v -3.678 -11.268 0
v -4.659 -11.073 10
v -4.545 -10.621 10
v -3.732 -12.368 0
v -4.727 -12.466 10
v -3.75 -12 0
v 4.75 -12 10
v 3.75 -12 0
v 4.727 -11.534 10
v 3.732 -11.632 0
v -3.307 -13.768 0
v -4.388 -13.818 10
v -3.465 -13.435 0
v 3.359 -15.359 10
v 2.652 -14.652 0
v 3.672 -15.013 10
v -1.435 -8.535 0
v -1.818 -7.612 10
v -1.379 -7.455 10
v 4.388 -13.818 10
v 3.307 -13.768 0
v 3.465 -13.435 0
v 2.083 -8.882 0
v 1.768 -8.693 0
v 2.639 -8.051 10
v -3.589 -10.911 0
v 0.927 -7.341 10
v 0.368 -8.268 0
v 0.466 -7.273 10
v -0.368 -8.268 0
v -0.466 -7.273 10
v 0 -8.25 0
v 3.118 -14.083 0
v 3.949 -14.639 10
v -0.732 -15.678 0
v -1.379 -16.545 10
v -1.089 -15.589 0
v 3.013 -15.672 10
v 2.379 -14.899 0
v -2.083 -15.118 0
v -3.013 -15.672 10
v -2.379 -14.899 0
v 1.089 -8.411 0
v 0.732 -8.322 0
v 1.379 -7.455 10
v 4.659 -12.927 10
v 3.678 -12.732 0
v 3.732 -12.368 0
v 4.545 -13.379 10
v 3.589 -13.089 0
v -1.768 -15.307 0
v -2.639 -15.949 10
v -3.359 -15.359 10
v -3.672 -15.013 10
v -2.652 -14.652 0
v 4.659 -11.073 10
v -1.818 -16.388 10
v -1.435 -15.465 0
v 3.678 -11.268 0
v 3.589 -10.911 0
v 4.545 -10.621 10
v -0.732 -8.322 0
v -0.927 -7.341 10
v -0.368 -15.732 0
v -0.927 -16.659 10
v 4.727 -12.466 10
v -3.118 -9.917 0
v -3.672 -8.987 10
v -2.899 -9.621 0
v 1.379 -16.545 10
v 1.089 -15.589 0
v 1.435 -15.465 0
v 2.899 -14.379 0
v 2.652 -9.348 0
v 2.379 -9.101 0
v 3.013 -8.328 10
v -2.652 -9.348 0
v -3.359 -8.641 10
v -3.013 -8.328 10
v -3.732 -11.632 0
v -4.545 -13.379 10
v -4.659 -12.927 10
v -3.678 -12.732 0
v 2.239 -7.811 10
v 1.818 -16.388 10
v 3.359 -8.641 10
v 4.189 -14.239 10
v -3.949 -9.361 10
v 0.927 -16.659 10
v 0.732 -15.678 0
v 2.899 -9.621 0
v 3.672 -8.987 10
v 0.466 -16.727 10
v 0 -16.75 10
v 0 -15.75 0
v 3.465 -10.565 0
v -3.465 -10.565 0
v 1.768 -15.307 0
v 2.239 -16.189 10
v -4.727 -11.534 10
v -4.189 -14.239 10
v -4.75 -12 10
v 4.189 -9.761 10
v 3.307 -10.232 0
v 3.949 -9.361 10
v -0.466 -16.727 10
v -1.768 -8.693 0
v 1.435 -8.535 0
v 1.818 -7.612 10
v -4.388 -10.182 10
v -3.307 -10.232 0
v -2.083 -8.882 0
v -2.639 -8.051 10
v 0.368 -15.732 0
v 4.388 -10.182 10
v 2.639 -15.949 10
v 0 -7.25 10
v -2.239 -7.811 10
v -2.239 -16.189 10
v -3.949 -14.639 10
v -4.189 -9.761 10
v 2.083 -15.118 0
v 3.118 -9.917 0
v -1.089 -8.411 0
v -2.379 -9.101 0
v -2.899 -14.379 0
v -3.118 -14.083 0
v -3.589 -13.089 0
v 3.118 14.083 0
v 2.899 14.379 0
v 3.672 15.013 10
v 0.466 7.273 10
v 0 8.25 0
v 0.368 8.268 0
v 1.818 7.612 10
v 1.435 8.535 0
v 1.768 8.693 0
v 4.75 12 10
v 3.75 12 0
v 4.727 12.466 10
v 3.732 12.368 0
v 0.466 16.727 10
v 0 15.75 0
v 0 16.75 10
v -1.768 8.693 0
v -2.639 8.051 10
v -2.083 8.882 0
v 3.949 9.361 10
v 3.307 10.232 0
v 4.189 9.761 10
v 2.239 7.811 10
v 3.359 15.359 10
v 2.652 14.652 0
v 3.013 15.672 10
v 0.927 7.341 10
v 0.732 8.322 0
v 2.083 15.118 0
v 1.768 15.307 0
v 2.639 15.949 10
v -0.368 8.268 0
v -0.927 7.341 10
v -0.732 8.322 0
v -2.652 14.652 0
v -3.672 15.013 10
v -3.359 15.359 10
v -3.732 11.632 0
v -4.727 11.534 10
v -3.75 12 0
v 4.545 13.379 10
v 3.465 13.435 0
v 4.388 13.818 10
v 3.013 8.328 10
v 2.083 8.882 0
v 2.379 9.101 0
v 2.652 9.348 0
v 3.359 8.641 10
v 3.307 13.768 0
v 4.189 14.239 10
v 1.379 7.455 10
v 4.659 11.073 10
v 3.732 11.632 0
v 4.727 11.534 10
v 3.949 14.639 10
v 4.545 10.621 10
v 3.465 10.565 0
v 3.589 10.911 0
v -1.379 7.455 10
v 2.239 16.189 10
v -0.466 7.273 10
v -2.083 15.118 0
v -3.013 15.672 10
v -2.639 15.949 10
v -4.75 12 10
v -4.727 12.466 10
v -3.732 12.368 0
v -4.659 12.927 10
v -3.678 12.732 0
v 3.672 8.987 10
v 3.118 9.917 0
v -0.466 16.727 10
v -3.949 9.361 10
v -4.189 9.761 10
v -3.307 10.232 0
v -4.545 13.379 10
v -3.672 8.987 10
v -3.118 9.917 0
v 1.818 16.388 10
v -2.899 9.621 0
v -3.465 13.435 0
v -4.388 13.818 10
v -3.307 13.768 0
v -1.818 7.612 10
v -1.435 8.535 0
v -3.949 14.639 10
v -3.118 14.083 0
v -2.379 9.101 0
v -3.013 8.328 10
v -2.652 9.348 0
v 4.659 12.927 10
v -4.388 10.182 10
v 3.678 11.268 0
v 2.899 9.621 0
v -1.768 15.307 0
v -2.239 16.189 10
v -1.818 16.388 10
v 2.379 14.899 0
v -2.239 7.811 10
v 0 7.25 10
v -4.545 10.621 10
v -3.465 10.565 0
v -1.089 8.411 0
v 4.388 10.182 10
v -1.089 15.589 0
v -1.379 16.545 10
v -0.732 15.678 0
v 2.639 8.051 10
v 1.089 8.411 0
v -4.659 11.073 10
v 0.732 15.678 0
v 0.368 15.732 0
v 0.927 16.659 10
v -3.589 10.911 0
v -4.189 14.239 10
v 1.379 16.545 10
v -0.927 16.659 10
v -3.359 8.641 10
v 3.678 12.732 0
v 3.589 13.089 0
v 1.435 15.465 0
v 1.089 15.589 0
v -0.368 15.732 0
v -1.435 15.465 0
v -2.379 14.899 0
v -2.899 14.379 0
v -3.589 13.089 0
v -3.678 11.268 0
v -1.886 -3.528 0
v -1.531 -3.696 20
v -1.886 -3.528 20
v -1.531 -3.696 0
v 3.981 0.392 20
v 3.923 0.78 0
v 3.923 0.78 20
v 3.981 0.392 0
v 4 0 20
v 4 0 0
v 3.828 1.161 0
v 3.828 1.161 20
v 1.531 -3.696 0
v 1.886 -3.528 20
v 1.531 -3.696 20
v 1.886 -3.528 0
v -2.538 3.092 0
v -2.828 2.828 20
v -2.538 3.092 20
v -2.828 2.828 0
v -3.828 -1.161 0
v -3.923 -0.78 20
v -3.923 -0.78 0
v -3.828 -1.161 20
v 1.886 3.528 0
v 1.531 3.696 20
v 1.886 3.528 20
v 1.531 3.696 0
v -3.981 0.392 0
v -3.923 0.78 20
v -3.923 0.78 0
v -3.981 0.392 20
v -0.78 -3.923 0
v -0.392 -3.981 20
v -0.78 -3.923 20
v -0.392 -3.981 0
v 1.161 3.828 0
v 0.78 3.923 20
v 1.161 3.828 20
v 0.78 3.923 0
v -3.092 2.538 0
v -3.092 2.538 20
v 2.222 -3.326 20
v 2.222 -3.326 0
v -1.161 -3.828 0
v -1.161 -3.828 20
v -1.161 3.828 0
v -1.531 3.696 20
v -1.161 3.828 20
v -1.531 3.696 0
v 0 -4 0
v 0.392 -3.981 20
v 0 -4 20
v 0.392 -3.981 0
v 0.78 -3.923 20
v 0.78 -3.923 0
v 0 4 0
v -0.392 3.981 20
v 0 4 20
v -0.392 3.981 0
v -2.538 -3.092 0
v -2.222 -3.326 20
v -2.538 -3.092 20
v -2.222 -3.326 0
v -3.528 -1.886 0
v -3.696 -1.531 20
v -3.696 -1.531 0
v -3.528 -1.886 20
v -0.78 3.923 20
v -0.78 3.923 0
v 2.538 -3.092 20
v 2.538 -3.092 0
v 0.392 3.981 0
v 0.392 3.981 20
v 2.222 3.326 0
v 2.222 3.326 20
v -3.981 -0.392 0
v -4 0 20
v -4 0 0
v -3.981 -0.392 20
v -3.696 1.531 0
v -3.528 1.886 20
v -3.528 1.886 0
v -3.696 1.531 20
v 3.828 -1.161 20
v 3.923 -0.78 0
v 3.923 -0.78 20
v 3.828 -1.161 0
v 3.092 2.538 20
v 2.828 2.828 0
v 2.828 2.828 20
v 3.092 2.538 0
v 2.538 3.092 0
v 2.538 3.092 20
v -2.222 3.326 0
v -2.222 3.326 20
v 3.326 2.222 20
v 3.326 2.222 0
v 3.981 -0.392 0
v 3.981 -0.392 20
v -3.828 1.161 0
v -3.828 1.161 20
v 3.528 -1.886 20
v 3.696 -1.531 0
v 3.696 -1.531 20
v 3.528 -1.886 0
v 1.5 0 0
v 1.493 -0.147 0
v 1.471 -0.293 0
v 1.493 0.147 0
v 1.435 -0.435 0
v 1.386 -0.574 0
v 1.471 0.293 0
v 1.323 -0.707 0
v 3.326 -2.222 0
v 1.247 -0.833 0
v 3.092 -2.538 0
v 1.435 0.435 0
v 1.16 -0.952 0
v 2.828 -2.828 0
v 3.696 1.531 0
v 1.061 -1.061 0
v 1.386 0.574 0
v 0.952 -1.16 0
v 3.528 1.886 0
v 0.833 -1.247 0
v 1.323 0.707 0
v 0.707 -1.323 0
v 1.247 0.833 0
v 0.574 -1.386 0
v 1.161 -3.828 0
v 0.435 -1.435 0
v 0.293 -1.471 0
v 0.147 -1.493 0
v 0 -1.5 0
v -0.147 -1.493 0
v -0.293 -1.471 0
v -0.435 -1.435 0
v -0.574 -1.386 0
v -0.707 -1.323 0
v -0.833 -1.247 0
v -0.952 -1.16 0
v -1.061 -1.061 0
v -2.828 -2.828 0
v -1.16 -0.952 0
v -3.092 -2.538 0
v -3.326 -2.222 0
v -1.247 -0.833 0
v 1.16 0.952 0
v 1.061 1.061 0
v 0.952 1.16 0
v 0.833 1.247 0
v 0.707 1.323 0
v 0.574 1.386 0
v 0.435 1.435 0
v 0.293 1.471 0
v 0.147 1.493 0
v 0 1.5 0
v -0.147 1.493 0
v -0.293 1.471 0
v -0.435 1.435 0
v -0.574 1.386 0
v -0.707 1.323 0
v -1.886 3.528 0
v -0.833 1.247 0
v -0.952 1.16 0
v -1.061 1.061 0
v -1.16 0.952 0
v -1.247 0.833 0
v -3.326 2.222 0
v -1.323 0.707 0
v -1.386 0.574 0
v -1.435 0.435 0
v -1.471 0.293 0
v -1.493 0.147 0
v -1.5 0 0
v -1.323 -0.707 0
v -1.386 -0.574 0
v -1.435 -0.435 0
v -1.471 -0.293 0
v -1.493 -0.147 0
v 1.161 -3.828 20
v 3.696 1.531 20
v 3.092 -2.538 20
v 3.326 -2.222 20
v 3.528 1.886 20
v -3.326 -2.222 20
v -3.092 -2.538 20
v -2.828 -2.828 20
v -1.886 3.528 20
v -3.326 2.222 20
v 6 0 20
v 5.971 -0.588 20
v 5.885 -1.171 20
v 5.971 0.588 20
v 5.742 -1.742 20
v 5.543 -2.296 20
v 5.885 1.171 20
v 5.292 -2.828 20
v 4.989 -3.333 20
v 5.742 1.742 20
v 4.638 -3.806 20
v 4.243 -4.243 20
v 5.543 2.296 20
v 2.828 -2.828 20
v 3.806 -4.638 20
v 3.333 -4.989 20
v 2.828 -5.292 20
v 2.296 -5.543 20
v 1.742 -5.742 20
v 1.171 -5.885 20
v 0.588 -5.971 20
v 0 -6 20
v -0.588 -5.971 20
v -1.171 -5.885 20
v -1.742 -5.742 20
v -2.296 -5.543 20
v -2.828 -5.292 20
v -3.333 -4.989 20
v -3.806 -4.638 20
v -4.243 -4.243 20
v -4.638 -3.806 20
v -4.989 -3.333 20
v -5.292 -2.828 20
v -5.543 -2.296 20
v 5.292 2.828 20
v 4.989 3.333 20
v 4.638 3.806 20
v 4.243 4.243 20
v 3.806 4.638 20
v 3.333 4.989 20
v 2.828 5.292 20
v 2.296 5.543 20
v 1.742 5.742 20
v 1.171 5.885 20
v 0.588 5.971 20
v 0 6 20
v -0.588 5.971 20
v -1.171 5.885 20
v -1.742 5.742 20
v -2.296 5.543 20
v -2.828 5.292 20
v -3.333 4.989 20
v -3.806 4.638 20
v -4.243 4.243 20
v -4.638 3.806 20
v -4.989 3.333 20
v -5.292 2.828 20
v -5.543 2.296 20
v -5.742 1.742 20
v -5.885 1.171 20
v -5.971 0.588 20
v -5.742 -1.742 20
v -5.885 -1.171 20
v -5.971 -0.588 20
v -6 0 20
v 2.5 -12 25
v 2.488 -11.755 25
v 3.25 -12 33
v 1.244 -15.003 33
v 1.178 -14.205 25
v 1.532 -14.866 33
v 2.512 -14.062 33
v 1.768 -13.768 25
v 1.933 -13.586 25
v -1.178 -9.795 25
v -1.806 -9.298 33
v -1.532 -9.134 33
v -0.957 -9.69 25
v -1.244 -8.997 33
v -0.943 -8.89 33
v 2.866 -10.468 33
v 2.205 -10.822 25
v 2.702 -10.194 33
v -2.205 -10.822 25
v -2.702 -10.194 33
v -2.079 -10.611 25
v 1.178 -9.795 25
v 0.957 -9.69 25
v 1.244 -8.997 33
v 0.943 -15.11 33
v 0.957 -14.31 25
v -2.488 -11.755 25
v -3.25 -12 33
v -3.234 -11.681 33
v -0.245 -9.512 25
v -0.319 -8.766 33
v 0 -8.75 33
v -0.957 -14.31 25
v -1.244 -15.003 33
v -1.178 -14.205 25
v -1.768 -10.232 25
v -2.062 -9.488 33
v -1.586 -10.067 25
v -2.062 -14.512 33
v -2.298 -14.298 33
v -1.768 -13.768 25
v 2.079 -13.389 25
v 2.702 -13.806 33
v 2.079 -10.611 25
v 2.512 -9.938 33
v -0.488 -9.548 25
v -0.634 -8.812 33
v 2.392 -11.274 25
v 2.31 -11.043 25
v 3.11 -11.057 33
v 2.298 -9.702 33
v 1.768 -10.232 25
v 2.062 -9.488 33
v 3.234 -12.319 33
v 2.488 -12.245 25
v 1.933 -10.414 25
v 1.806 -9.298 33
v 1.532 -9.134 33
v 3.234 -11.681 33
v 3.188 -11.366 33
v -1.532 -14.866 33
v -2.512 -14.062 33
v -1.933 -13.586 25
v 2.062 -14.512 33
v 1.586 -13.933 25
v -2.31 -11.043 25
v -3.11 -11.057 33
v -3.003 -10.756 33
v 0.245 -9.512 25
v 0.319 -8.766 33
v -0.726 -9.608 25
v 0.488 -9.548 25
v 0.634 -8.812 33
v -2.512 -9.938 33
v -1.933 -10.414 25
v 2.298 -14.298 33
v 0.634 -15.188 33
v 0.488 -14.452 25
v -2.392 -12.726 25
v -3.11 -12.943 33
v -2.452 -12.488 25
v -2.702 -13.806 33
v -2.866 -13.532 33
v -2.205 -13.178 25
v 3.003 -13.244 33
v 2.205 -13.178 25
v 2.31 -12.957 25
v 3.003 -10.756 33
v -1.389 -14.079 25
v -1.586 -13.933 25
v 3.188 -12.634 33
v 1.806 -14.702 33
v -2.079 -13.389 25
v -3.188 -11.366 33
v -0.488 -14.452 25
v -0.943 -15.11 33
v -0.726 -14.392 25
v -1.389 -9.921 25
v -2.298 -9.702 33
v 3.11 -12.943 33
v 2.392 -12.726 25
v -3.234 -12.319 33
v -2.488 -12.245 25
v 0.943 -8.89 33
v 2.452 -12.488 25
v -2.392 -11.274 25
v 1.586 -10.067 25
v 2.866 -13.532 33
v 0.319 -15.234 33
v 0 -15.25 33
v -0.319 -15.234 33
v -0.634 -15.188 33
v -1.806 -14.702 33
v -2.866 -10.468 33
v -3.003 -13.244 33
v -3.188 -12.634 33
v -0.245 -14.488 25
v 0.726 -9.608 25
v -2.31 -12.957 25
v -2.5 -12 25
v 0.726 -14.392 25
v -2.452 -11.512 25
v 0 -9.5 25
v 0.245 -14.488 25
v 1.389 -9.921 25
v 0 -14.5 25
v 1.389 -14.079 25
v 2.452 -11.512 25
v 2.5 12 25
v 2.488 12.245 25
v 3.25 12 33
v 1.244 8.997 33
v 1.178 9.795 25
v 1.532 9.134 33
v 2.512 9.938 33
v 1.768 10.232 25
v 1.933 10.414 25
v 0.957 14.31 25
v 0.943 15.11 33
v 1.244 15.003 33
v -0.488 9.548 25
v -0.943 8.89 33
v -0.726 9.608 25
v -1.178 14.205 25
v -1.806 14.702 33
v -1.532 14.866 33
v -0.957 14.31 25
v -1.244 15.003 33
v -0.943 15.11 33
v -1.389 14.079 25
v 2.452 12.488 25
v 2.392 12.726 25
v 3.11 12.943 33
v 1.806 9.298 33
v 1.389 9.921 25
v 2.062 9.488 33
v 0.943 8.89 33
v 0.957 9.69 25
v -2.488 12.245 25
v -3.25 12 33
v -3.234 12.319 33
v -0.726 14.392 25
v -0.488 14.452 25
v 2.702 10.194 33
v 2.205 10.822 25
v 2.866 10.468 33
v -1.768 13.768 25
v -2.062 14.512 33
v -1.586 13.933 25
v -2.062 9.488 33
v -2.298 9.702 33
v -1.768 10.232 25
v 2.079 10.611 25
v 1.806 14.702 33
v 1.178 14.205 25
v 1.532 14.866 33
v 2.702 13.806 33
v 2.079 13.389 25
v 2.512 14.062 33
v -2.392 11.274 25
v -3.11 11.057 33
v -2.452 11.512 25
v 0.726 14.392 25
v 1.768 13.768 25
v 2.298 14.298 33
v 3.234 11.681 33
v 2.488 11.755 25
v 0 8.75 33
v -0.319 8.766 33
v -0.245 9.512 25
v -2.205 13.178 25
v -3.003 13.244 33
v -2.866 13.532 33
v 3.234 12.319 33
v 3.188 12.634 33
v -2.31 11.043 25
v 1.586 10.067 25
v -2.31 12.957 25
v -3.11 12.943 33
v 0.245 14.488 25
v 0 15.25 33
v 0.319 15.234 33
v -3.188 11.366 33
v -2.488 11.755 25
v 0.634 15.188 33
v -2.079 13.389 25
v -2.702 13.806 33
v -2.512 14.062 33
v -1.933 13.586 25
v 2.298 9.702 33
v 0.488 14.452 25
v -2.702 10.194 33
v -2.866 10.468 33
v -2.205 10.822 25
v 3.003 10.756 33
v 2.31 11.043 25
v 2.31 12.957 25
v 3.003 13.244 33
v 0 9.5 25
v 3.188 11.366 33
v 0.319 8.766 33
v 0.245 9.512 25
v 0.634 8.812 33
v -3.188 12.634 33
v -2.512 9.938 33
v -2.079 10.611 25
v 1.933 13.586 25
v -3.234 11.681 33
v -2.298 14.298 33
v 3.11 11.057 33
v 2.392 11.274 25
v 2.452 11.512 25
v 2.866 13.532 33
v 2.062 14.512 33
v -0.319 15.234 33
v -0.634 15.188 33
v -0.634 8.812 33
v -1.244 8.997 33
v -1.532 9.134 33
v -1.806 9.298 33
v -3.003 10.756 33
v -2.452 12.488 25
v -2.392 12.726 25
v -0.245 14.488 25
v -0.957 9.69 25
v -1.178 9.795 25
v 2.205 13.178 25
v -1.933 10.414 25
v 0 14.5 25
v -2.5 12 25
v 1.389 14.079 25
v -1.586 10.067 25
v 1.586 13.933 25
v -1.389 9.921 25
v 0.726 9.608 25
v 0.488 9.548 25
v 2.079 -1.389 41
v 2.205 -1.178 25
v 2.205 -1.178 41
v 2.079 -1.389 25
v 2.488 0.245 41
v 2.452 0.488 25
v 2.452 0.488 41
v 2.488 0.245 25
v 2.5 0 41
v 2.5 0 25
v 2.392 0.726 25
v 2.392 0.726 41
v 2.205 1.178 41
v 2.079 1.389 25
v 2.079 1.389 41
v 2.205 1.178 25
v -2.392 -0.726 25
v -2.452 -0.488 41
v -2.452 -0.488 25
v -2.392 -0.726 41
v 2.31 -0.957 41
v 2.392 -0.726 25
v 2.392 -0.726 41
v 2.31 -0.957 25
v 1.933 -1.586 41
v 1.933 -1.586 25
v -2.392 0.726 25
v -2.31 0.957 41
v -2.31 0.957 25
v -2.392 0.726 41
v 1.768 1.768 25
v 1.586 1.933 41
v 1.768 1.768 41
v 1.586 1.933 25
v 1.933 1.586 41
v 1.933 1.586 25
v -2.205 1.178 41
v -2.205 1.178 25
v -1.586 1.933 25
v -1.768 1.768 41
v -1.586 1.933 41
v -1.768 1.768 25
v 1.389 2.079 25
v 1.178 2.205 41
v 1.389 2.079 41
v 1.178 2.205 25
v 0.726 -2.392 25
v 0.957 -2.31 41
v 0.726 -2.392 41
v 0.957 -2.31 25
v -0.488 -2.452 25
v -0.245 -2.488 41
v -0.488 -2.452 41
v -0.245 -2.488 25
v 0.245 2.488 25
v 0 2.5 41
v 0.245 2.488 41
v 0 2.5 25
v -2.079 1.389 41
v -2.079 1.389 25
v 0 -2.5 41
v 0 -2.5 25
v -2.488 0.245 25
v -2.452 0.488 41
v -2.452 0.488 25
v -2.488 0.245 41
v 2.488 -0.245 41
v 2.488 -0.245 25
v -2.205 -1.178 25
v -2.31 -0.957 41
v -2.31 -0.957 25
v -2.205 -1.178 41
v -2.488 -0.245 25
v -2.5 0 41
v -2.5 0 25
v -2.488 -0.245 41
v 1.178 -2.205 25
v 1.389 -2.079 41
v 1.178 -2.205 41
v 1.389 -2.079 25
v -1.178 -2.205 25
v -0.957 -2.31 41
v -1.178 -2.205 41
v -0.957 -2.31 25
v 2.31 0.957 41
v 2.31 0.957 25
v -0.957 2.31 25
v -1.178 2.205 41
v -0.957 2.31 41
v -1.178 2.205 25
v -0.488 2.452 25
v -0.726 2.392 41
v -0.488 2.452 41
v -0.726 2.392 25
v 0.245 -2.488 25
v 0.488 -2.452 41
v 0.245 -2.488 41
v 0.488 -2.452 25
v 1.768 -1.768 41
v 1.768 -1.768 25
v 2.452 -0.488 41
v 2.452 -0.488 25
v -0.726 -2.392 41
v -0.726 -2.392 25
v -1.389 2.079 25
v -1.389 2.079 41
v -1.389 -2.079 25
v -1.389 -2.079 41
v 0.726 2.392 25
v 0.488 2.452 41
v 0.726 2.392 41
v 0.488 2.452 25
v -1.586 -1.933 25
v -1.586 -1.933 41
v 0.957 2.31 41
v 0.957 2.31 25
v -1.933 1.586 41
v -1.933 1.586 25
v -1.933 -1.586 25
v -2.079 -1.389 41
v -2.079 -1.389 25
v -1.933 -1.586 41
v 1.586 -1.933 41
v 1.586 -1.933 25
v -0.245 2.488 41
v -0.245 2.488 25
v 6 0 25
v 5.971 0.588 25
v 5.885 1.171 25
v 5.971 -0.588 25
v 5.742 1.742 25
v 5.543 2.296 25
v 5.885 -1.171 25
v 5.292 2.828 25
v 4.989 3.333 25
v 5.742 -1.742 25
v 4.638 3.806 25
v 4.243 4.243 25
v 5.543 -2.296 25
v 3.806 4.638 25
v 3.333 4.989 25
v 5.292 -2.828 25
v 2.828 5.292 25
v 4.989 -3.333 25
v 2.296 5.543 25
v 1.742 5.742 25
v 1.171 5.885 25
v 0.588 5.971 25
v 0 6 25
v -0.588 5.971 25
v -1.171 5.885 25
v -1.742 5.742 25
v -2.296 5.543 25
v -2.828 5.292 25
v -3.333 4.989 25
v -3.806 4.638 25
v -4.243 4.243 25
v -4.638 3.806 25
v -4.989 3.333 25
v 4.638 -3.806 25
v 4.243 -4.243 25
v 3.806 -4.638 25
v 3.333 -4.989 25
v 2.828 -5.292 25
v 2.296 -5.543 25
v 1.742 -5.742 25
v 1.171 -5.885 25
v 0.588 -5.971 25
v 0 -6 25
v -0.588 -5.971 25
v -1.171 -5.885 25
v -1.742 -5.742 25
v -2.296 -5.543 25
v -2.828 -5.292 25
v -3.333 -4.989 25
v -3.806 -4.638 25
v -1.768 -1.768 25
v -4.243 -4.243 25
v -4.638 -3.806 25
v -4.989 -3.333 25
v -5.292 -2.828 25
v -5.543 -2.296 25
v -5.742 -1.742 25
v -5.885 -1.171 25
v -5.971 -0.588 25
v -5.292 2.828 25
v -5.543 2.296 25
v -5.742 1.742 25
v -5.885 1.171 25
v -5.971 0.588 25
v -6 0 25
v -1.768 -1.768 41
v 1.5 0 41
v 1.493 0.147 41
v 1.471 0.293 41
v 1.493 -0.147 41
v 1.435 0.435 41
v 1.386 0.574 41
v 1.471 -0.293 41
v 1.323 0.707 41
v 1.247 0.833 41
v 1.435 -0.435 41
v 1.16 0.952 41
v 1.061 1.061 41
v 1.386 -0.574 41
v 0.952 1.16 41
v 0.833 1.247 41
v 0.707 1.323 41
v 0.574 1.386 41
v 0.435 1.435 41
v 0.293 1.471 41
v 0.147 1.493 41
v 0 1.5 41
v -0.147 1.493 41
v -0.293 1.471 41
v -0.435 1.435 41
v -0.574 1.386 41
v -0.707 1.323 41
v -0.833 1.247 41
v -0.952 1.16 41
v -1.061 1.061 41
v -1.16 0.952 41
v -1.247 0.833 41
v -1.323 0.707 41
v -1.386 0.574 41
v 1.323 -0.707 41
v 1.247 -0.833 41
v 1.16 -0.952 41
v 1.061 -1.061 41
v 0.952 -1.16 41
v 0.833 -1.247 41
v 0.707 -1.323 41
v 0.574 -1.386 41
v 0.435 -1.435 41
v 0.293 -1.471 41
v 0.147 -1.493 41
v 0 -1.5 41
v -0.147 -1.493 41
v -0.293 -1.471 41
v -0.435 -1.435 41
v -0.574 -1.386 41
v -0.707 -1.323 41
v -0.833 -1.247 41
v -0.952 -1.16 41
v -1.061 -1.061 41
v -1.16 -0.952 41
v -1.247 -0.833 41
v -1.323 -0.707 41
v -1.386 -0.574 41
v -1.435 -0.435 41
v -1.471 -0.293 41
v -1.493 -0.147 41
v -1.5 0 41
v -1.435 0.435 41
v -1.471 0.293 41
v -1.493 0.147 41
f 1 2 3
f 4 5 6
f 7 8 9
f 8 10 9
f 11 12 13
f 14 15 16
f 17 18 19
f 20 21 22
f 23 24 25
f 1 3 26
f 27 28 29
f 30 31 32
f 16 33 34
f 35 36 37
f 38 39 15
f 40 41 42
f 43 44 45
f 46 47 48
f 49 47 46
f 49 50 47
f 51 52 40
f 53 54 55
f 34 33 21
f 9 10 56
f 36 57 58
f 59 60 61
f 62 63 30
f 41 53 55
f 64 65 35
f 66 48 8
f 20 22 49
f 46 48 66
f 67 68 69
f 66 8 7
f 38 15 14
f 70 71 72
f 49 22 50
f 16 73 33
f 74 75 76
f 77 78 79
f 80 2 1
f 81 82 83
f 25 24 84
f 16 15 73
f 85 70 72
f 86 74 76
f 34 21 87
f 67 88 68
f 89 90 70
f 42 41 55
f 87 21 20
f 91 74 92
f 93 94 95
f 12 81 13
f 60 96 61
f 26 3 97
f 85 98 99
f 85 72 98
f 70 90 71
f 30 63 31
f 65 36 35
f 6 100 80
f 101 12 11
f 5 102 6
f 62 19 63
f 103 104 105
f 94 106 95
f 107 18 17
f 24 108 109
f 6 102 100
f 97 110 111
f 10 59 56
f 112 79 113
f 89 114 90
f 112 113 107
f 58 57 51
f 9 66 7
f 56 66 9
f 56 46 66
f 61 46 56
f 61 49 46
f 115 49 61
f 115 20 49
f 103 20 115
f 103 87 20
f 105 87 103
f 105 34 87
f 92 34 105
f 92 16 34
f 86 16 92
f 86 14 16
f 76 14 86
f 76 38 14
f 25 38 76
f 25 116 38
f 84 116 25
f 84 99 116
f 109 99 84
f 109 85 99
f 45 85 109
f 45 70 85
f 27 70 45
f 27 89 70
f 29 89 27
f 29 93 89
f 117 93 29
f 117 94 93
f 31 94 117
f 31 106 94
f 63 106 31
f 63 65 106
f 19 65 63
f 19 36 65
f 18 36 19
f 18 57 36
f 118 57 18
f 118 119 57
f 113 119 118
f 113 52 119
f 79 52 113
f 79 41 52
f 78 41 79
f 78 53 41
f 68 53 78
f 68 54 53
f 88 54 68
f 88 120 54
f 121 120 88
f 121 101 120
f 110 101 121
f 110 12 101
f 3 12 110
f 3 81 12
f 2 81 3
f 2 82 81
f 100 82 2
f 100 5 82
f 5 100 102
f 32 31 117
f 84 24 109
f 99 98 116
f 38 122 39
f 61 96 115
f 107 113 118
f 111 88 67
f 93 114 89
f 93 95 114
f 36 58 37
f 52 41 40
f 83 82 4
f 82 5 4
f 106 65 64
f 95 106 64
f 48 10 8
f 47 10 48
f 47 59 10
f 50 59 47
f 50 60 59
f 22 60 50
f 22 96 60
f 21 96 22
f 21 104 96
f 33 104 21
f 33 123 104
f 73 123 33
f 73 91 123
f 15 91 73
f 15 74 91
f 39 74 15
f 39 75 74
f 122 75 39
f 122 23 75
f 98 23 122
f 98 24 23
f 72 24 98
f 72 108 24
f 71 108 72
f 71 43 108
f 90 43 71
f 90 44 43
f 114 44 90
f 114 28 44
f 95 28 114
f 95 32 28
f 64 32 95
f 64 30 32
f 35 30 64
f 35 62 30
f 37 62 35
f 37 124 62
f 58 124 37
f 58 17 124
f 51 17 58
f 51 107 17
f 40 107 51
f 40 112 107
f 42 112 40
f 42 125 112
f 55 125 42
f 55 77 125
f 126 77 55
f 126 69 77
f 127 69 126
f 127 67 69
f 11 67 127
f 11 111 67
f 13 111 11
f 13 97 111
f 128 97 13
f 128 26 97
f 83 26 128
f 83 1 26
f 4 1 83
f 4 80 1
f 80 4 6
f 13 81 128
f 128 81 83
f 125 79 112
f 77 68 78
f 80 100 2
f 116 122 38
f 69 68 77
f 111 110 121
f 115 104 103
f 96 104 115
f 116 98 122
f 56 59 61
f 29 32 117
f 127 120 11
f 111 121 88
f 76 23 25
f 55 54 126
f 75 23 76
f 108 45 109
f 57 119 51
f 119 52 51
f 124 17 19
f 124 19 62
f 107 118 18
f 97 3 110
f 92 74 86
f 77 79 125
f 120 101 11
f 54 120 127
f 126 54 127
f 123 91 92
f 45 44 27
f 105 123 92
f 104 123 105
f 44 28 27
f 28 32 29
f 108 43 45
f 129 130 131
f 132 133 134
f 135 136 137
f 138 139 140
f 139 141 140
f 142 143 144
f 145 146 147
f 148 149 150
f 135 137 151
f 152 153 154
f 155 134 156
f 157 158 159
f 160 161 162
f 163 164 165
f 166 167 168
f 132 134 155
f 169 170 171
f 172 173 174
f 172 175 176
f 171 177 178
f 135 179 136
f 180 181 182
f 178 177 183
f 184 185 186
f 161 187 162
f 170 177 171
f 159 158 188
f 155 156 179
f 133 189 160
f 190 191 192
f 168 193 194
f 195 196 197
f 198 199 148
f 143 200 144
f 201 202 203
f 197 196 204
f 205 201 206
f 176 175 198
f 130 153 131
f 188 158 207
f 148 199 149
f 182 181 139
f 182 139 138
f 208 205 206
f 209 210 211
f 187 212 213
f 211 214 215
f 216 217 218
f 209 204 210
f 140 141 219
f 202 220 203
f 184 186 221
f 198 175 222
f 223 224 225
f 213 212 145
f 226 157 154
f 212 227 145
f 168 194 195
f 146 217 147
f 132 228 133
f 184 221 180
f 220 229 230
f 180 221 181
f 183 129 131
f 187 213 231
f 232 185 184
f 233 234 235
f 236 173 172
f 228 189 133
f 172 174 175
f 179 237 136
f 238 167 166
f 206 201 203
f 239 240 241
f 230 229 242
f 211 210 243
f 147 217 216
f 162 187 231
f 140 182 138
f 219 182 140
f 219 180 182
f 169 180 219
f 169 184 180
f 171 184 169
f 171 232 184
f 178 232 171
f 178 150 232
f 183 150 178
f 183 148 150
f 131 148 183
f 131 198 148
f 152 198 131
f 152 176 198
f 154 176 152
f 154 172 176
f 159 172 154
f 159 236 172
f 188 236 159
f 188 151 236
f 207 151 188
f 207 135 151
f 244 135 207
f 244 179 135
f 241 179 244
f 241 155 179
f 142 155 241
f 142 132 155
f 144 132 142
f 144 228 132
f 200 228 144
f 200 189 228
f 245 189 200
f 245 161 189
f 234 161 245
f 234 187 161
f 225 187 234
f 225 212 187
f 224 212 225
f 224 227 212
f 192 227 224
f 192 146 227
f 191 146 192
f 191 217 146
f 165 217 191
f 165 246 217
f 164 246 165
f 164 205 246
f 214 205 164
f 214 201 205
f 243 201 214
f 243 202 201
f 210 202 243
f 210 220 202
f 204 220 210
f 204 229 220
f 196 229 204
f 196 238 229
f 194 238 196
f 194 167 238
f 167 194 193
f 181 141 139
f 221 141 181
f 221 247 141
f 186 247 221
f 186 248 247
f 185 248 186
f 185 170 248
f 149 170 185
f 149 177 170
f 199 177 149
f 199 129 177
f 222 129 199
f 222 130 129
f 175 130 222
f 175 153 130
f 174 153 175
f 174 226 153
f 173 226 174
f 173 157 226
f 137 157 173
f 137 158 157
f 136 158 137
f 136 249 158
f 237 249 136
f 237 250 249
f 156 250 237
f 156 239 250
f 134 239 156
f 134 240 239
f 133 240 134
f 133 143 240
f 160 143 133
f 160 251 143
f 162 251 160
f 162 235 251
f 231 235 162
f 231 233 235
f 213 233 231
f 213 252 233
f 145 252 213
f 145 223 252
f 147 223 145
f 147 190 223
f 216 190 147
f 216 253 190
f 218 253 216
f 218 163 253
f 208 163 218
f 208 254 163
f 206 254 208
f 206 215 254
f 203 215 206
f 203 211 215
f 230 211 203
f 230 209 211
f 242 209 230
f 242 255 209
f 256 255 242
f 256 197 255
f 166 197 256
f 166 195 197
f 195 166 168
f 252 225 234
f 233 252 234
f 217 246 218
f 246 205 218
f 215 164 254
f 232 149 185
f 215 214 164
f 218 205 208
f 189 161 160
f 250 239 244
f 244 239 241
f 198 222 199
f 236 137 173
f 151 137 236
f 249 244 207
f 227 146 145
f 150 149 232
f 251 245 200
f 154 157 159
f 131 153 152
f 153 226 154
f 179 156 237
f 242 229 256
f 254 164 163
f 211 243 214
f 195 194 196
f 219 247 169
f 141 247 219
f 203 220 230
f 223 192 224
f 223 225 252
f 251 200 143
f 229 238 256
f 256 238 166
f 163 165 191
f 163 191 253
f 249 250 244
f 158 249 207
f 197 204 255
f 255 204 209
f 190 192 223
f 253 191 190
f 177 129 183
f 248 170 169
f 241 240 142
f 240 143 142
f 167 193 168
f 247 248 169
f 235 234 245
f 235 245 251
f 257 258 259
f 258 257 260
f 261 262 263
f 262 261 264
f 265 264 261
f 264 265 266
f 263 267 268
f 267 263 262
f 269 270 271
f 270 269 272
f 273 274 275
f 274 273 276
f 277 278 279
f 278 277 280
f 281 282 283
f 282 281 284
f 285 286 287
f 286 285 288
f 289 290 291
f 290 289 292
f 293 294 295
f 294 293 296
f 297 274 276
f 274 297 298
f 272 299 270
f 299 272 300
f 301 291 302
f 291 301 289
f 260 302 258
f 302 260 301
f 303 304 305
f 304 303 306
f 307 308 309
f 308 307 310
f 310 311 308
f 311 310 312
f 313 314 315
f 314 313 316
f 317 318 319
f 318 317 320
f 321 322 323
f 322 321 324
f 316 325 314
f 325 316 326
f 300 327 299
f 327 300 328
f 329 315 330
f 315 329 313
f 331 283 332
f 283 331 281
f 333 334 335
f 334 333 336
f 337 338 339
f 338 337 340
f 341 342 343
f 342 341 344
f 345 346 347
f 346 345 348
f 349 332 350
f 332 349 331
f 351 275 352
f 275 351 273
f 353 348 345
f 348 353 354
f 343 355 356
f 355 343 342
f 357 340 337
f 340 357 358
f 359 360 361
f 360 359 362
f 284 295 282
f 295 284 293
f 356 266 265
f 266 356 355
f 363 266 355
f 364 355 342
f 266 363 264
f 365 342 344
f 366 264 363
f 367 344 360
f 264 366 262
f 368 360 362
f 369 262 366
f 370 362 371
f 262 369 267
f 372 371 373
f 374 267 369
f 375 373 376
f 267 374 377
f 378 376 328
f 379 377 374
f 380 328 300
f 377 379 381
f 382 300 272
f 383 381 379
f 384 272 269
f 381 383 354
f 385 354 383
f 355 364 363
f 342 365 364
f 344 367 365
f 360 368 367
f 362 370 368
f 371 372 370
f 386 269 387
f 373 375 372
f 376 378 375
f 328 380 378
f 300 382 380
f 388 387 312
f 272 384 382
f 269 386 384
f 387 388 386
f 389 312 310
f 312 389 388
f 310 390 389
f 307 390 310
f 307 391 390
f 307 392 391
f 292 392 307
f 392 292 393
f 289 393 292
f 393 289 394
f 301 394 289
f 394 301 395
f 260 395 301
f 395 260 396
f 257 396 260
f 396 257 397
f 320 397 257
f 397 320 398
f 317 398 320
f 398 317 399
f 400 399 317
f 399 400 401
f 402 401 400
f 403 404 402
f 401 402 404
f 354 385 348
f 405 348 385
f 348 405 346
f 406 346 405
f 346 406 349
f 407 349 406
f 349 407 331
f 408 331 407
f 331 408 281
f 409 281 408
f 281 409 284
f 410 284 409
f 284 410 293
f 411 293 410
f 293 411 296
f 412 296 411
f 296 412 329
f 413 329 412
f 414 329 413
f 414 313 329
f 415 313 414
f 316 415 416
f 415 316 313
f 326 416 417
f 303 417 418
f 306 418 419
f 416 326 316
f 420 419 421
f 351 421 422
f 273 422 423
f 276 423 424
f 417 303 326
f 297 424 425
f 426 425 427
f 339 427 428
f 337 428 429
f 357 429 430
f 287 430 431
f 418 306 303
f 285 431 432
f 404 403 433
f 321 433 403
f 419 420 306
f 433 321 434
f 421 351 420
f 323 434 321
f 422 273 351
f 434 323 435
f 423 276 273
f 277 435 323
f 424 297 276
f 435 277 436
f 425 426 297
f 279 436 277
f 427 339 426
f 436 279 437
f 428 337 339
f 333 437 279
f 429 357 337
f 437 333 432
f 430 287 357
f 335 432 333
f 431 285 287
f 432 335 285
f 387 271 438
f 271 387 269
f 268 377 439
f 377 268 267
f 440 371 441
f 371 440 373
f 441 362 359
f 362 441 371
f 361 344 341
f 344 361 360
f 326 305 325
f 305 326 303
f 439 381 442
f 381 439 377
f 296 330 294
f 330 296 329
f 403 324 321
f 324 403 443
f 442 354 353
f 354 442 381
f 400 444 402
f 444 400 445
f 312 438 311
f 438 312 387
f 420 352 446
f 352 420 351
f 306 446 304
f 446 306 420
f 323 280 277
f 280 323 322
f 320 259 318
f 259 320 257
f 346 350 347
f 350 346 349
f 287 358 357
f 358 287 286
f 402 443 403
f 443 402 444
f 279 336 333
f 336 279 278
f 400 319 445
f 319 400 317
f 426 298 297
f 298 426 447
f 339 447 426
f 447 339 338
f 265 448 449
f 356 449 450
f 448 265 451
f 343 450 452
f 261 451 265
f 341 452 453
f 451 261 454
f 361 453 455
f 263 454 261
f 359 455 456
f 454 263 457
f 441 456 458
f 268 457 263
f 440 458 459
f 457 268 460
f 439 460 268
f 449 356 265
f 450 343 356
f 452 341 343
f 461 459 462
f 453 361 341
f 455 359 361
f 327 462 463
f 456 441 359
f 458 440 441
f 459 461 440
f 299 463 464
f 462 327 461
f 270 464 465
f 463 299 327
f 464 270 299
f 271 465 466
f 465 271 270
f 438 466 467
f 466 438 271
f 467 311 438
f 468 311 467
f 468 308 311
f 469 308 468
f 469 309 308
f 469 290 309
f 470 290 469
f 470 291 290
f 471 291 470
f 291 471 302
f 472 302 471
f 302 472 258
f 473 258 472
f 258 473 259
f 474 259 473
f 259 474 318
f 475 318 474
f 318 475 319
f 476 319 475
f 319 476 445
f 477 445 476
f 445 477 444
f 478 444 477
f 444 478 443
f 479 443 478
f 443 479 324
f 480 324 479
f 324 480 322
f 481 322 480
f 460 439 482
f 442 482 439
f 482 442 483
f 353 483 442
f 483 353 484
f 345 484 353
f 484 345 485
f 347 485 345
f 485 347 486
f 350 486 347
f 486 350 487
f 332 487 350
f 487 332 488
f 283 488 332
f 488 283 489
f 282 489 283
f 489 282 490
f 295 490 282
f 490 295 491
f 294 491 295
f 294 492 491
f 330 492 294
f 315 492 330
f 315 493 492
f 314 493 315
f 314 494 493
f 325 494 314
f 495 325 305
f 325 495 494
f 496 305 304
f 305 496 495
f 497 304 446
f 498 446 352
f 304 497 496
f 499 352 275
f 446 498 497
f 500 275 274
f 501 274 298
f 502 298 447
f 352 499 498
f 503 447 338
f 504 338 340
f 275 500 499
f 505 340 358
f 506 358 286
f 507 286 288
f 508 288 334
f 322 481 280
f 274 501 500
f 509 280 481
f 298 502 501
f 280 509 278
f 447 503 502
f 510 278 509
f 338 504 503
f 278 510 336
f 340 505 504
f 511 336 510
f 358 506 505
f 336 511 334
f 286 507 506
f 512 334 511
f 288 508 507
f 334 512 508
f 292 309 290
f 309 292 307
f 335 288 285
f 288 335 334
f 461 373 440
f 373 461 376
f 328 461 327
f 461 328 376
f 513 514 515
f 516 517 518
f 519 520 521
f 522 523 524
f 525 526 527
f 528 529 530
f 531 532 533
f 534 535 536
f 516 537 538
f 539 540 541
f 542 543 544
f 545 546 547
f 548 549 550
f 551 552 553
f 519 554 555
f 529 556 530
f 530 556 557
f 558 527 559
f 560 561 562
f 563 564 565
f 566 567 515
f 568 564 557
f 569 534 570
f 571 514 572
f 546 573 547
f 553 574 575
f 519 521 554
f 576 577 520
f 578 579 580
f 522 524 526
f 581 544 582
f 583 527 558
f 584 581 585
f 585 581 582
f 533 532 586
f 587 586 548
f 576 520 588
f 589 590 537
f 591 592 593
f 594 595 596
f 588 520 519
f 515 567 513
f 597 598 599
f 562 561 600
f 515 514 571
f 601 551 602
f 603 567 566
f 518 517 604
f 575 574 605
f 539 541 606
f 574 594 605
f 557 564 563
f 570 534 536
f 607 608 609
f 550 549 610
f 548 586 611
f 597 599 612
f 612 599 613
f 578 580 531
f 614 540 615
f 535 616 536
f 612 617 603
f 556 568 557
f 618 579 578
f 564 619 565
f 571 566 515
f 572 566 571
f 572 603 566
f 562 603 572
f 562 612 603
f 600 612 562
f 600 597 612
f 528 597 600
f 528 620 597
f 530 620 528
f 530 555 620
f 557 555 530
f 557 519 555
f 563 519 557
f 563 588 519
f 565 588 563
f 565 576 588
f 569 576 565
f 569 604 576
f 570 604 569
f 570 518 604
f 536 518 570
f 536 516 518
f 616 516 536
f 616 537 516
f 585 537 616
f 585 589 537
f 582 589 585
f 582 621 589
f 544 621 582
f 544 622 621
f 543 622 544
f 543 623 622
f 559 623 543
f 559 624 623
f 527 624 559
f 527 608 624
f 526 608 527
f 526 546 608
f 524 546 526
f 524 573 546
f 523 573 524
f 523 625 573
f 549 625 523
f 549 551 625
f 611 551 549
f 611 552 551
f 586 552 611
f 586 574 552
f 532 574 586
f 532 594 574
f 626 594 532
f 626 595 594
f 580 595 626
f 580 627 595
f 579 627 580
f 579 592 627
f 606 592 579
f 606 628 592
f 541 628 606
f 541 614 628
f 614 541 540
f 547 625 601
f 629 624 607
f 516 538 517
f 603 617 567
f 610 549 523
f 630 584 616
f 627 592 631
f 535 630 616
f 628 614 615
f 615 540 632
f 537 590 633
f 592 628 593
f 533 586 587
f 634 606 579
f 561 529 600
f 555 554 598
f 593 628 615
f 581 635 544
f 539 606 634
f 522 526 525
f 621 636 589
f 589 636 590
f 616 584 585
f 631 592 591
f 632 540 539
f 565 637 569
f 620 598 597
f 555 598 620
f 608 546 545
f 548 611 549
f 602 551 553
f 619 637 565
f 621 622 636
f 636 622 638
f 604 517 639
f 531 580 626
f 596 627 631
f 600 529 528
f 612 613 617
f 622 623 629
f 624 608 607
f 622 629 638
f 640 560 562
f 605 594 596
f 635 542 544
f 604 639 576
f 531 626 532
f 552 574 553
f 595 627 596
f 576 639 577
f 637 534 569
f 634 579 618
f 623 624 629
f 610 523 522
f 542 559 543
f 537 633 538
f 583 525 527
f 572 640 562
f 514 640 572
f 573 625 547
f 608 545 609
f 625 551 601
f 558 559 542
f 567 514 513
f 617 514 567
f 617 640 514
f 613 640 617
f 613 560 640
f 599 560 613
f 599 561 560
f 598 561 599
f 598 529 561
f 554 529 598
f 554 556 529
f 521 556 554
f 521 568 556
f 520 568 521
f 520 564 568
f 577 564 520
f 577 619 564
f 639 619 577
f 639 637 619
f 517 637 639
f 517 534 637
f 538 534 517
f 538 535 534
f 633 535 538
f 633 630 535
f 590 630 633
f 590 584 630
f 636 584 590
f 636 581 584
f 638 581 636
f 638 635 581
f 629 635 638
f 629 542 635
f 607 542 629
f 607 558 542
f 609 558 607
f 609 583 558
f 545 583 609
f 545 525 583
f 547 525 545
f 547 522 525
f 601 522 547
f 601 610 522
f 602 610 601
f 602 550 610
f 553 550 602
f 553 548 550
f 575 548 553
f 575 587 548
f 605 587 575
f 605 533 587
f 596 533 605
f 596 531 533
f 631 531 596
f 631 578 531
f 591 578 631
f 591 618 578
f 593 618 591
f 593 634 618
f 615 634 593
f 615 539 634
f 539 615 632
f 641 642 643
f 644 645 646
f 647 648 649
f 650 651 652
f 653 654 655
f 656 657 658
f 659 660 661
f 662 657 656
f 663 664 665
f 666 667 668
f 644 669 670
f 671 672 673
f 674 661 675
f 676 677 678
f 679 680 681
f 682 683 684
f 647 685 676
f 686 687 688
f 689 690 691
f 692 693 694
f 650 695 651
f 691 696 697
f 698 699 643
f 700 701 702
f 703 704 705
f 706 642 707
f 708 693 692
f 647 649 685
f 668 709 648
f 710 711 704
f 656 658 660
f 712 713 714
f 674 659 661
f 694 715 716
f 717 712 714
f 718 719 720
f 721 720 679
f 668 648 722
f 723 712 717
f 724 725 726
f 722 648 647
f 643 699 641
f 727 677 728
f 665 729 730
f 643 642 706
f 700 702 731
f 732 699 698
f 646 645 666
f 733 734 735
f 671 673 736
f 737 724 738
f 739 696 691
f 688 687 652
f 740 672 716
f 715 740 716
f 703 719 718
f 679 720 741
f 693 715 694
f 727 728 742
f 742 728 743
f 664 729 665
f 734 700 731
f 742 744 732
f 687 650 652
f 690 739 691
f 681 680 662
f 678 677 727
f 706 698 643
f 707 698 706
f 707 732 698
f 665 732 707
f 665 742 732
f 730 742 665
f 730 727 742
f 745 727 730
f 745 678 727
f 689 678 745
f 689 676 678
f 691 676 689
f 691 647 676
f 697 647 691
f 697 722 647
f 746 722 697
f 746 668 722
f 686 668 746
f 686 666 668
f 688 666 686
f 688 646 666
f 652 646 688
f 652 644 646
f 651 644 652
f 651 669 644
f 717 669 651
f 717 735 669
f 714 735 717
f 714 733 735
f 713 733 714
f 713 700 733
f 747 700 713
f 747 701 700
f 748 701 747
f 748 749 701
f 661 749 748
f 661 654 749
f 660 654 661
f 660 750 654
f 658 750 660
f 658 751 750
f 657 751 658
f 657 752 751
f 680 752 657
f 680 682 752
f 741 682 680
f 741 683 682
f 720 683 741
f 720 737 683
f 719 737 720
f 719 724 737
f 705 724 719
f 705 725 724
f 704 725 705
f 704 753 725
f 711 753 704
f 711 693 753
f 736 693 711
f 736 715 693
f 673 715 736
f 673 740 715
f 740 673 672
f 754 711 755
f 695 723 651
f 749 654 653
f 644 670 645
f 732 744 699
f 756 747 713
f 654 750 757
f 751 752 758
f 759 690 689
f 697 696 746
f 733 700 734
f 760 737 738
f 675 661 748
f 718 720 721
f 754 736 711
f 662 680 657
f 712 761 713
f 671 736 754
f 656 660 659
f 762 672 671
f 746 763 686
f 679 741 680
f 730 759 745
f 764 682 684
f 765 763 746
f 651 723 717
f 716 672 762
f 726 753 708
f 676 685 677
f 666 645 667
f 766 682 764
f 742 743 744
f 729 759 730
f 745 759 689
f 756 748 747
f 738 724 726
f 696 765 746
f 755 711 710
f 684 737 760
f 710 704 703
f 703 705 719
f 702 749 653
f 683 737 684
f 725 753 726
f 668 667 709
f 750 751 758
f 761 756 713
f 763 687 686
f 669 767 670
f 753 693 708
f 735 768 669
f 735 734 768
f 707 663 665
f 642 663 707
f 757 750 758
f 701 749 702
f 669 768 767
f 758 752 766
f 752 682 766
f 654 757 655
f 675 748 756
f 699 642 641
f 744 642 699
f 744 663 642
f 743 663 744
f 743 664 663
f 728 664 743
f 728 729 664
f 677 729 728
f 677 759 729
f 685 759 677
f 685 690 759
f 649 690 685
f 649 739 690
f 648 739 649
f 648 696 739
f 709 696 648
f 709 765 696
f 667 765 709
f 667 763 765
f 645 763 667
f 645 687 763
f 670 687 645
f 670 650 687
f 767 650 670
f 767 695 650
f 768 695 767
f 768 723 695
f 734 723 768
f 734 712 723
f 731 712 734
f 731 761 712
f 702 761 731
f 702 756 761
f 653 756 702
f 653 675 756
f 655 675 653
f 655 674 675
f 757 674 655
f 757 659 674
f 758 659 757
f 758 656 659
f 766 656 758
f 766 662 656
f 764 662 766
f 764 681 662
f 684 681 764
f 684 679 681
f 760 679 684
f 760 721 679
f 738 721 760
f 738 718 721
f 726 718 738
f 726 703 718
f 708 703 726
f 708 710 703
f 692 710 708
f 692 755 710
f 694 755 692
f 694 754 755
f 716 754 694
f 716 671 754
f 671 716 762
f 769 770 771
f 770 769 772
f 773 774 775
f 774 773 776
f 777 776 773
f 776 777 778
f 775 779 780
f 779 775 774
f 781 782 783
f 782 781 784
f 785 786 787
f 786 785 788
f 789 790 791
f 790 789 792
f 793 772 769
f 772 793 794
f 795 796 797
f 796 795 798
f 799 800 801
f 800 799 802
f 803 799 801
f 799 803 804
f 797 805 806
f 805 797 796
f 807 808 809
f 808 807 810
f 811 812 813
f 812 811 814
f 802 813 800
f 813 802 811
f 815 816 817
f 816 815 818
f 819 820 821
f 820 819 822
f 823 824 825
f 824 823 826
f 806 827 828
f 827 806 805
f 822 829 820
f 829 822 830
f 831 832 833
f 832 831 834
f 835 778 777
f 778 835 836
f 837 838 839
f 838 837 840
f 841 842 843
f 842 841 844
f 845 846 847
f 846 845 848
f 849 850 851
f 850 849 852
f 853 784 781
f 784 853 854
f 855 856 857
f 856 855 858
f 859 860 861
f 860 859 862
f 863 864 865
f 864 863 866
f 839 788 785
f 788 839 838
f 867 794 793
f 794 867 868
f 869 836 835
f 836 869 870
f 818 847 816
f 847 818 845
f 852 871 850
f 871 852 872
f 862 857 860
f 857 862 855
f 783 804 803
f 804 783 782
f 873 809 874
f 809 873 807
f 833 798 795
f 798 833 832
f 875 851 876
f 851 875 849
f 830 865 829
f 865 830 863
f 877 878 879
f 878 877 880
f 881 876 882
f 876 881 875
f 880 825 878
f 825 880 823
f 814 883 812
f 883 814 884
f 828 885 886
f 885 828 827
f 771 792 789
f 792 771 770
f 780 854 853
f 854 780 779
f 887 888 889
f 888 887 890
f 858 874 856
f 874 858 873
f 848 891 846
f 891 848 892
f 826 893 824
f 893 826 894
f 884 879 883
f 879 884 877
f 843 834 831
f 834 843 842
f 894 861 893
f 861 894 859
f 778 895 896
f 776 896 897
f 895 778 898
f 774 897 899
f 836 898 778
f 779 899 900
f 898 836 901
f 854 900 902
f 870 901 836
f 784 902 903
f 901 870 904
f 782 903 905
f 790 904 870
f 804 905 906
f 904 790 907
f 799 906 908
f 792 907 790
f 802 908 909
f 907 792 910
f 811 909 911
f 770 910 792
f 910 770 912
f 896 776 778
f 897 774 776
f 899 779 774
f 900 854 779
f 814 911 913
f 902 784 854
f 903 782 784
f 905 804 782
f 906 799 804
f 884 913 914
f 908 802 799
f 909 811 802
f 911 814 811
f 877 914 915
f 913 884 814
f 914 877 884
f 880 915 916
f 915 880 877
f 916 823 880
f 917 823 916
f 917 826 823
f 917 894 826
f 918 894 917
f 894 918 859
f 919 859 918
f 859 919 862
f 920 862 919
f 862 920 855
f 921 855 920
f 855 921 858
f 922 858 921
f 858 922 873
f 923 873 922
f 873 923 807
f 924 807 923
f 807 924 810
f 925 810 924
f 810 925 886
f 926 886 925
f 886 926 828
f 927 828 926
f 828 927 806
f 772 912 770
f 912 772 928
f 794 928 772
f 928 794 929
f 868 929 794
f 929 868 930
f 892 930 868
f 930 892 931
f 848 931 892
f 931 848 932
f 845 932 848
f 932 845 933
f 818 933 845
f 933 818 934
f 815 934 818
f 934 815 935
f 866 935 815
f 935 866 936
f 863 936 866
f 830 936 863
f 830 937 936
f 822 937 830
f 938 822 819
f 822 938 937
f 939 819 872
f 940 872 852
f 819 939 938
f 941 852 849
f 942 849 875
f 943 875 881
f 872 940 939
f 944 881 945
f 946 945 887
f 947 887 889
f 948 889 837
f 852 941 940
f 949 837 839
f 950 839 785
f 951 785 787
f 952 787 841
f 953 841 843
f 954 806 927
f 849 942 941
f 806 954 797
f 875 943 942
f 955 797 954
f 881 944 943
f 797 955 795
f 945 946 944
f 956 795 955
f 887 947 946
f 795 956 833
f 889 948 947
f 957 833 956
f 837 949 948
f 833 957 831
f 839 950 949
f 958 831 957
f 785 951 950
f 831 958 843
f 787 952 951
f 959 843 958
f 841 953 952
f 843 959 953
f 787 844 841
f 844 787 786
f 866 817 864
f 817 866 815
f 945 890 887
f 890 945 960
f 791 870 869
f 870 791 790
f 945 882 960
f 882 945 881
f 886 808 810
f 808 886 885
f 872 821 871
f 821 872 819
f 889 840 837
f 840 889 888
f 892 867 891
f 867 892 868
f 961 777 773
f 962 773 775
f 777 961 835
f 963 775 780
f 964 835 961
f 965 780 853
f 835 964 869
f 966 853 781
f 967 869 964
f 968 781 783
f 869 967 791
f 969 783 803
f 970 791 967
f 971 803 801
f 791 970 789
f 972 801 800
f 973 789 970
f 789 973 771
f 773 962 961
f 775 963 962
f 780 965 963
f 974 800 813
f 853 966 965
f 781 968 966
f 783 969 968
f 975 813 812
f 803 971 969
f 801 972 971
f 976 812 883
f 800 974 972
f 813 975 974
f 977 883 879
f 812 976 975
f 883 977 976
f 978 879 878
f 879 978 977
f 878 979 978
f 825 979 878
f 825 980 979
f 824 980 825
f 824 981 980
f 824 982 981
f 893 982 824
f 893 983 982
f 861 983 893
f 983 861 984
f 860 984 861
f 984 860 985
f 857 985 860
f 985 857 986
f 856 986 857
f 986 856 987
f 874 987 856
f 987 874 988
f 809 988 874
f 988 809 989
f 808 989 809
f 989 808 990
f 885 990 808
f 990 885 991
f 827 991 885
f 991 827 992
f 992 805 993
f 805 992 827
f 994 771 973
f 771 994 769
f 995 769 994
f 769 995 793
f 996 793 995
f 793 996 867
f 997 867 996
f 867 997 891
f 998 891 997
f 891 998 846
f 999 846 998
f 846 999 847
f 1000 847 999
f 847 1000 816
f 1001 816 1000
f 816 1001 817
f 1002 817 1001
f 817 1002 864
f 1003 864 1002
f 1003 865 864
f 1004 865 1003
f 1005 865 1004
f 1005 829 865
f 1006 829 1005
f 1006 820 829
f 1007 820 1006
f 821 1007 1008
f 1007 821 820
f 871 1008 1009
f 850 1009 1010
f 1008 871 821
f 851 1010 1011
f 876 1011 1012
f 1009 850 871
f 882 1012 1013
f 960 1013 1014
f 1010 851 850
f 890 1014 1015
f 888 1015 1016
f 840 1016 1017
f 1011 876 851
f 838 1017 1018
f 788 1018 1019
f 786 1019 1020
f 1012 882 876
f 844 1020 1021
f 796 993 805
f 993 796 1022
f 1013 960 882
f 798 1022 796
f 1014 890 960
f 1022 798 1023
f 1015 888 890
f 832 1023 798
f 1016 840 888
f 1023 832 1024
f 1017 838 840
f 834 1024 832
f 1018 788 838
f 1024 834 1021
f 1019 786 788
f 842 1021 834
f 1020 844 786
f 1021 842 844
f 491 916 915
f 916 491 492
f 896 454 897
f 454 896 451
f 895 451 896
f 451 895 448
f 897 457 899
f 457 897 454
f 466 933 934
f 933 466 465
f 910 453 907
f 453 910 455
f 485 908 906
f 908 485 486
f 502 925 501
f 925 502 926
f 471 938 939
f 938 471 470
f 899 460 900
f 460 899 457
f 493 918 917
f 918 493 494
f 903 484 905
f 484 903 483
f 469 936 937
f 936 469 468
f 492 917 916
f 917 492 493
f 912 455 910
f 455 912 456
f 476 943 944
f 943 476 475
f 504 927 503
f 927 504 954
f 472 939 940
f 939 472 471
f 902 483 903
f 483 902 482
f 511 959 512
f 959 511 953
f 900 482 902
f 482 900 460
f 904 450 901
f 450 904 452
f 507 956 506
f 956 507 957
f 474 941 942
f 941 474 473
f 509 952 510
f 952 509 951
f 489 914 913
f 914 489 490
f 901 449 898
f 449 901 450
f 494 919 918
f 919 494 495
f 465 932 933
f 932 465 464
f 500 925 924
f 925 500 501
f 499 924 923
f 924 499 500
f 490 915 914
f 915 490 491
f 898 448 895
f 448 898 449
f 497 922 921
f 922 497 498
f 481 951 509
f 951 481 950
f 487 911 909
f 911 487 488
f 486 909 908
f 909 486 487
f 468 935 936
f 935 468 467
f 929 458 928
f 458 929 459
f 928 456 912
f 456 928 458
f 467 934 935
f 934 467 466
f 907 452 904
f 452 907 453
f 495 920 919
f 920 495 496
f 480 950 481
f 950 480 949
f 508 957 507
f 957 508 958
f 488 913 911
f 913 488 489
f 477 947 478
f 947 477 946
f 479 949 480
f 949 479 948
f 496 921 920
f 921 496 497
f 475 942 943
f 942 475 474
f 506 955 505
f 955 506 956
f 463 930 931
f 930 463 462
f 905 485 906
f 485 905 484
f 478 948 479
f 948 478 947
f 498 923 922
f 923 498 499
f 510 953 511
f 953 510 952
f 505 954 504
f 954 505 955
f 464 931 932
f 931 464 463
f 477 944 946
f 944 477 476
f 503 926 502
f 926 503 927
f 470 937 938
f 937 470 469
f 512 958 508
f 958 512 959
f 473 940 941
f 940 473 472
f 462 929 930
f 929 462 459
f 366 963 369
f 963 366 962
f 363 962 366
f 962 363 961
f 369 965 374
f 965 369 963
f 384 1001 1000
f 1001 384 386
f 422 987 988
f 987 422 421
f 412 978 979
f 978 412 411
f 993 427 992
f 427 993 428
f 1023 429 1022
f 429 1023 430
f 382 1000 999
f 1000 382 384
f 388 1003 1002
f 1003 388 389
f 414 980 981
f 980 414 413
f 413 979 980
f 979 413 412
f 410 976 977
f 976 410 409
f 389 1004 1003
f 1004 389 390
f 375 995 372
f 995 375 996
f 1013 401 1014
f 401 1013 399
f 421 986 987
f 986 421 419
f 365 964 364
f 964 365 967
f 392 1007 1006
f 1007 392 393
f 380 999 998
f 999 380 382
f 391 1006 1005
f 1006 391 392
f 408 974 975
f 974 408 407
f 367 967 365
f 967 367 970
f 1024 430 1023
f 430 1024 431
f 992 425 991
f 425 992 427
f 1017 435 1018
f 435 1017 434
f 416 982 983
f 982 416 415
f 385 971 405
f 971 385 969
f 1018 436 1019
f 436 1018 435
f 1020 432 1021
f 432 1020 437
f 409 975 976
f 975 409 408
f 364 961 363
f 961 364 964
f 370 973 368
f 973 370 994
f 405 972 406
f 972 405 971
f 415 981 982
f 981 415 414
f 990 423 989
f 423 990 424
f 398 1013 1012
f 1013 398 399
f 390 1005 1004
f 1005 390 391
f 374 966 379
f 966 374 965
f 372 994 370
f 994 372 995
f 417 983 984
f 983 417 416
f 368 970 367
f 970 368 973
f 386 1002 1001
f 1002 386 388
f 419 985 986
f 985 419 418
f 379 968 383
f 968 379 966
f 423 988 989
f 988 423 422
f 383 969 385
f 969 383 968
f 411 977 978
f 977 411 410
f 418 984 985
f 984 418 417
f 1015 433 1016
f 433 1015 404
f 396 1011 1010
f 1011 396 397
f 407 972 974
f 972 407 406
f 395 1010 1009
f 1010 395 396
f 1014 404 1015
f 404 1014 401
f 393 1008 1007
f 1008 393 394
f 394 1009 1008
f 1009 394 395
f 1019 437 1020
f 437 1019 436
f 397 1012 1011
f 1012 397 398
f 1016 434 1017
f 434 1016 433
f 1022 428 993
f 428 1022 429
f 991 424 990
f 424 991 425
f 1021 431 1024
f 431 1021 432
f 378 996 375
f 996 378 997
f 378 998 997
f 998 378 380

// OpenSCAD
// Straight hose-barb reducer: 8 mm tubing (z = 0..20) -> 5 mm tubing (z = 25..41)
// Print orientation: standing upright along +Z, centred on the origin in X/Y.
// Units: mm. Bore: 3 mm through full length.

$fn = 64;

// ---- Dimensions ----
tube_od      = 8;    // 8 mm tubing outer diameter (no wall specified)
tube_id      = 5;    // 5 mm tubing inner diameter (no wall specified)
barb_h8      = 10;   // height of each 8 mm barb
barb_h5      = 8;    // height of each 5 mm barb
barb_base7   = 7.5;  // outer diameter of 8 mm barbs at their bottom
barb_top9    = 9.5;  // outer diameter of 8 mm barbs at their top
barb_top6    = 6.5;  // outer diameter of 5 mm barbs at their top
barb_bot5    = 5.0;  // outer diameter of 5 mm barbs at their bottom
collar_d     = 12;   // diameter of the z = 20..25 collar
bore_d       = 3;    // through-bore diameter
eps          = 0.5;  // overshoot for clean boolean cuts

// ---- Model ----
difference() {
    union() {
        // 8 mm tubing section with two stacked barbs
        translate([0, 0, 0]) {
            cylinder(h = 20, d = tube_od);
            for (s = [-1, 1])
                translate([0, s * 12, 0])
                    cylinder(h = barb_h8, d1 = barb_base7, d2 = barb_top9);
        }

        // 5 mm tubing section with two stacked barbs
        translate([0, 0, 25]) {
            cylinder(h = 16, d = tube_id);
            for (s = [-1, 1])
                translate([0, s * 12, 0])
                    cylinder(h = barb_h5, d1 = barb_bot5, d2 = barb_top6);
        }

        // Cylindrical collar (z = 20..25)
        translate([0, 0, 20])
            cylinder(h = 5, d = collar_d);
    }

    // 3 mm through-bore
    translate([0, 0, -eps])
        cylinder(h = 42, d = bore_d);
}
